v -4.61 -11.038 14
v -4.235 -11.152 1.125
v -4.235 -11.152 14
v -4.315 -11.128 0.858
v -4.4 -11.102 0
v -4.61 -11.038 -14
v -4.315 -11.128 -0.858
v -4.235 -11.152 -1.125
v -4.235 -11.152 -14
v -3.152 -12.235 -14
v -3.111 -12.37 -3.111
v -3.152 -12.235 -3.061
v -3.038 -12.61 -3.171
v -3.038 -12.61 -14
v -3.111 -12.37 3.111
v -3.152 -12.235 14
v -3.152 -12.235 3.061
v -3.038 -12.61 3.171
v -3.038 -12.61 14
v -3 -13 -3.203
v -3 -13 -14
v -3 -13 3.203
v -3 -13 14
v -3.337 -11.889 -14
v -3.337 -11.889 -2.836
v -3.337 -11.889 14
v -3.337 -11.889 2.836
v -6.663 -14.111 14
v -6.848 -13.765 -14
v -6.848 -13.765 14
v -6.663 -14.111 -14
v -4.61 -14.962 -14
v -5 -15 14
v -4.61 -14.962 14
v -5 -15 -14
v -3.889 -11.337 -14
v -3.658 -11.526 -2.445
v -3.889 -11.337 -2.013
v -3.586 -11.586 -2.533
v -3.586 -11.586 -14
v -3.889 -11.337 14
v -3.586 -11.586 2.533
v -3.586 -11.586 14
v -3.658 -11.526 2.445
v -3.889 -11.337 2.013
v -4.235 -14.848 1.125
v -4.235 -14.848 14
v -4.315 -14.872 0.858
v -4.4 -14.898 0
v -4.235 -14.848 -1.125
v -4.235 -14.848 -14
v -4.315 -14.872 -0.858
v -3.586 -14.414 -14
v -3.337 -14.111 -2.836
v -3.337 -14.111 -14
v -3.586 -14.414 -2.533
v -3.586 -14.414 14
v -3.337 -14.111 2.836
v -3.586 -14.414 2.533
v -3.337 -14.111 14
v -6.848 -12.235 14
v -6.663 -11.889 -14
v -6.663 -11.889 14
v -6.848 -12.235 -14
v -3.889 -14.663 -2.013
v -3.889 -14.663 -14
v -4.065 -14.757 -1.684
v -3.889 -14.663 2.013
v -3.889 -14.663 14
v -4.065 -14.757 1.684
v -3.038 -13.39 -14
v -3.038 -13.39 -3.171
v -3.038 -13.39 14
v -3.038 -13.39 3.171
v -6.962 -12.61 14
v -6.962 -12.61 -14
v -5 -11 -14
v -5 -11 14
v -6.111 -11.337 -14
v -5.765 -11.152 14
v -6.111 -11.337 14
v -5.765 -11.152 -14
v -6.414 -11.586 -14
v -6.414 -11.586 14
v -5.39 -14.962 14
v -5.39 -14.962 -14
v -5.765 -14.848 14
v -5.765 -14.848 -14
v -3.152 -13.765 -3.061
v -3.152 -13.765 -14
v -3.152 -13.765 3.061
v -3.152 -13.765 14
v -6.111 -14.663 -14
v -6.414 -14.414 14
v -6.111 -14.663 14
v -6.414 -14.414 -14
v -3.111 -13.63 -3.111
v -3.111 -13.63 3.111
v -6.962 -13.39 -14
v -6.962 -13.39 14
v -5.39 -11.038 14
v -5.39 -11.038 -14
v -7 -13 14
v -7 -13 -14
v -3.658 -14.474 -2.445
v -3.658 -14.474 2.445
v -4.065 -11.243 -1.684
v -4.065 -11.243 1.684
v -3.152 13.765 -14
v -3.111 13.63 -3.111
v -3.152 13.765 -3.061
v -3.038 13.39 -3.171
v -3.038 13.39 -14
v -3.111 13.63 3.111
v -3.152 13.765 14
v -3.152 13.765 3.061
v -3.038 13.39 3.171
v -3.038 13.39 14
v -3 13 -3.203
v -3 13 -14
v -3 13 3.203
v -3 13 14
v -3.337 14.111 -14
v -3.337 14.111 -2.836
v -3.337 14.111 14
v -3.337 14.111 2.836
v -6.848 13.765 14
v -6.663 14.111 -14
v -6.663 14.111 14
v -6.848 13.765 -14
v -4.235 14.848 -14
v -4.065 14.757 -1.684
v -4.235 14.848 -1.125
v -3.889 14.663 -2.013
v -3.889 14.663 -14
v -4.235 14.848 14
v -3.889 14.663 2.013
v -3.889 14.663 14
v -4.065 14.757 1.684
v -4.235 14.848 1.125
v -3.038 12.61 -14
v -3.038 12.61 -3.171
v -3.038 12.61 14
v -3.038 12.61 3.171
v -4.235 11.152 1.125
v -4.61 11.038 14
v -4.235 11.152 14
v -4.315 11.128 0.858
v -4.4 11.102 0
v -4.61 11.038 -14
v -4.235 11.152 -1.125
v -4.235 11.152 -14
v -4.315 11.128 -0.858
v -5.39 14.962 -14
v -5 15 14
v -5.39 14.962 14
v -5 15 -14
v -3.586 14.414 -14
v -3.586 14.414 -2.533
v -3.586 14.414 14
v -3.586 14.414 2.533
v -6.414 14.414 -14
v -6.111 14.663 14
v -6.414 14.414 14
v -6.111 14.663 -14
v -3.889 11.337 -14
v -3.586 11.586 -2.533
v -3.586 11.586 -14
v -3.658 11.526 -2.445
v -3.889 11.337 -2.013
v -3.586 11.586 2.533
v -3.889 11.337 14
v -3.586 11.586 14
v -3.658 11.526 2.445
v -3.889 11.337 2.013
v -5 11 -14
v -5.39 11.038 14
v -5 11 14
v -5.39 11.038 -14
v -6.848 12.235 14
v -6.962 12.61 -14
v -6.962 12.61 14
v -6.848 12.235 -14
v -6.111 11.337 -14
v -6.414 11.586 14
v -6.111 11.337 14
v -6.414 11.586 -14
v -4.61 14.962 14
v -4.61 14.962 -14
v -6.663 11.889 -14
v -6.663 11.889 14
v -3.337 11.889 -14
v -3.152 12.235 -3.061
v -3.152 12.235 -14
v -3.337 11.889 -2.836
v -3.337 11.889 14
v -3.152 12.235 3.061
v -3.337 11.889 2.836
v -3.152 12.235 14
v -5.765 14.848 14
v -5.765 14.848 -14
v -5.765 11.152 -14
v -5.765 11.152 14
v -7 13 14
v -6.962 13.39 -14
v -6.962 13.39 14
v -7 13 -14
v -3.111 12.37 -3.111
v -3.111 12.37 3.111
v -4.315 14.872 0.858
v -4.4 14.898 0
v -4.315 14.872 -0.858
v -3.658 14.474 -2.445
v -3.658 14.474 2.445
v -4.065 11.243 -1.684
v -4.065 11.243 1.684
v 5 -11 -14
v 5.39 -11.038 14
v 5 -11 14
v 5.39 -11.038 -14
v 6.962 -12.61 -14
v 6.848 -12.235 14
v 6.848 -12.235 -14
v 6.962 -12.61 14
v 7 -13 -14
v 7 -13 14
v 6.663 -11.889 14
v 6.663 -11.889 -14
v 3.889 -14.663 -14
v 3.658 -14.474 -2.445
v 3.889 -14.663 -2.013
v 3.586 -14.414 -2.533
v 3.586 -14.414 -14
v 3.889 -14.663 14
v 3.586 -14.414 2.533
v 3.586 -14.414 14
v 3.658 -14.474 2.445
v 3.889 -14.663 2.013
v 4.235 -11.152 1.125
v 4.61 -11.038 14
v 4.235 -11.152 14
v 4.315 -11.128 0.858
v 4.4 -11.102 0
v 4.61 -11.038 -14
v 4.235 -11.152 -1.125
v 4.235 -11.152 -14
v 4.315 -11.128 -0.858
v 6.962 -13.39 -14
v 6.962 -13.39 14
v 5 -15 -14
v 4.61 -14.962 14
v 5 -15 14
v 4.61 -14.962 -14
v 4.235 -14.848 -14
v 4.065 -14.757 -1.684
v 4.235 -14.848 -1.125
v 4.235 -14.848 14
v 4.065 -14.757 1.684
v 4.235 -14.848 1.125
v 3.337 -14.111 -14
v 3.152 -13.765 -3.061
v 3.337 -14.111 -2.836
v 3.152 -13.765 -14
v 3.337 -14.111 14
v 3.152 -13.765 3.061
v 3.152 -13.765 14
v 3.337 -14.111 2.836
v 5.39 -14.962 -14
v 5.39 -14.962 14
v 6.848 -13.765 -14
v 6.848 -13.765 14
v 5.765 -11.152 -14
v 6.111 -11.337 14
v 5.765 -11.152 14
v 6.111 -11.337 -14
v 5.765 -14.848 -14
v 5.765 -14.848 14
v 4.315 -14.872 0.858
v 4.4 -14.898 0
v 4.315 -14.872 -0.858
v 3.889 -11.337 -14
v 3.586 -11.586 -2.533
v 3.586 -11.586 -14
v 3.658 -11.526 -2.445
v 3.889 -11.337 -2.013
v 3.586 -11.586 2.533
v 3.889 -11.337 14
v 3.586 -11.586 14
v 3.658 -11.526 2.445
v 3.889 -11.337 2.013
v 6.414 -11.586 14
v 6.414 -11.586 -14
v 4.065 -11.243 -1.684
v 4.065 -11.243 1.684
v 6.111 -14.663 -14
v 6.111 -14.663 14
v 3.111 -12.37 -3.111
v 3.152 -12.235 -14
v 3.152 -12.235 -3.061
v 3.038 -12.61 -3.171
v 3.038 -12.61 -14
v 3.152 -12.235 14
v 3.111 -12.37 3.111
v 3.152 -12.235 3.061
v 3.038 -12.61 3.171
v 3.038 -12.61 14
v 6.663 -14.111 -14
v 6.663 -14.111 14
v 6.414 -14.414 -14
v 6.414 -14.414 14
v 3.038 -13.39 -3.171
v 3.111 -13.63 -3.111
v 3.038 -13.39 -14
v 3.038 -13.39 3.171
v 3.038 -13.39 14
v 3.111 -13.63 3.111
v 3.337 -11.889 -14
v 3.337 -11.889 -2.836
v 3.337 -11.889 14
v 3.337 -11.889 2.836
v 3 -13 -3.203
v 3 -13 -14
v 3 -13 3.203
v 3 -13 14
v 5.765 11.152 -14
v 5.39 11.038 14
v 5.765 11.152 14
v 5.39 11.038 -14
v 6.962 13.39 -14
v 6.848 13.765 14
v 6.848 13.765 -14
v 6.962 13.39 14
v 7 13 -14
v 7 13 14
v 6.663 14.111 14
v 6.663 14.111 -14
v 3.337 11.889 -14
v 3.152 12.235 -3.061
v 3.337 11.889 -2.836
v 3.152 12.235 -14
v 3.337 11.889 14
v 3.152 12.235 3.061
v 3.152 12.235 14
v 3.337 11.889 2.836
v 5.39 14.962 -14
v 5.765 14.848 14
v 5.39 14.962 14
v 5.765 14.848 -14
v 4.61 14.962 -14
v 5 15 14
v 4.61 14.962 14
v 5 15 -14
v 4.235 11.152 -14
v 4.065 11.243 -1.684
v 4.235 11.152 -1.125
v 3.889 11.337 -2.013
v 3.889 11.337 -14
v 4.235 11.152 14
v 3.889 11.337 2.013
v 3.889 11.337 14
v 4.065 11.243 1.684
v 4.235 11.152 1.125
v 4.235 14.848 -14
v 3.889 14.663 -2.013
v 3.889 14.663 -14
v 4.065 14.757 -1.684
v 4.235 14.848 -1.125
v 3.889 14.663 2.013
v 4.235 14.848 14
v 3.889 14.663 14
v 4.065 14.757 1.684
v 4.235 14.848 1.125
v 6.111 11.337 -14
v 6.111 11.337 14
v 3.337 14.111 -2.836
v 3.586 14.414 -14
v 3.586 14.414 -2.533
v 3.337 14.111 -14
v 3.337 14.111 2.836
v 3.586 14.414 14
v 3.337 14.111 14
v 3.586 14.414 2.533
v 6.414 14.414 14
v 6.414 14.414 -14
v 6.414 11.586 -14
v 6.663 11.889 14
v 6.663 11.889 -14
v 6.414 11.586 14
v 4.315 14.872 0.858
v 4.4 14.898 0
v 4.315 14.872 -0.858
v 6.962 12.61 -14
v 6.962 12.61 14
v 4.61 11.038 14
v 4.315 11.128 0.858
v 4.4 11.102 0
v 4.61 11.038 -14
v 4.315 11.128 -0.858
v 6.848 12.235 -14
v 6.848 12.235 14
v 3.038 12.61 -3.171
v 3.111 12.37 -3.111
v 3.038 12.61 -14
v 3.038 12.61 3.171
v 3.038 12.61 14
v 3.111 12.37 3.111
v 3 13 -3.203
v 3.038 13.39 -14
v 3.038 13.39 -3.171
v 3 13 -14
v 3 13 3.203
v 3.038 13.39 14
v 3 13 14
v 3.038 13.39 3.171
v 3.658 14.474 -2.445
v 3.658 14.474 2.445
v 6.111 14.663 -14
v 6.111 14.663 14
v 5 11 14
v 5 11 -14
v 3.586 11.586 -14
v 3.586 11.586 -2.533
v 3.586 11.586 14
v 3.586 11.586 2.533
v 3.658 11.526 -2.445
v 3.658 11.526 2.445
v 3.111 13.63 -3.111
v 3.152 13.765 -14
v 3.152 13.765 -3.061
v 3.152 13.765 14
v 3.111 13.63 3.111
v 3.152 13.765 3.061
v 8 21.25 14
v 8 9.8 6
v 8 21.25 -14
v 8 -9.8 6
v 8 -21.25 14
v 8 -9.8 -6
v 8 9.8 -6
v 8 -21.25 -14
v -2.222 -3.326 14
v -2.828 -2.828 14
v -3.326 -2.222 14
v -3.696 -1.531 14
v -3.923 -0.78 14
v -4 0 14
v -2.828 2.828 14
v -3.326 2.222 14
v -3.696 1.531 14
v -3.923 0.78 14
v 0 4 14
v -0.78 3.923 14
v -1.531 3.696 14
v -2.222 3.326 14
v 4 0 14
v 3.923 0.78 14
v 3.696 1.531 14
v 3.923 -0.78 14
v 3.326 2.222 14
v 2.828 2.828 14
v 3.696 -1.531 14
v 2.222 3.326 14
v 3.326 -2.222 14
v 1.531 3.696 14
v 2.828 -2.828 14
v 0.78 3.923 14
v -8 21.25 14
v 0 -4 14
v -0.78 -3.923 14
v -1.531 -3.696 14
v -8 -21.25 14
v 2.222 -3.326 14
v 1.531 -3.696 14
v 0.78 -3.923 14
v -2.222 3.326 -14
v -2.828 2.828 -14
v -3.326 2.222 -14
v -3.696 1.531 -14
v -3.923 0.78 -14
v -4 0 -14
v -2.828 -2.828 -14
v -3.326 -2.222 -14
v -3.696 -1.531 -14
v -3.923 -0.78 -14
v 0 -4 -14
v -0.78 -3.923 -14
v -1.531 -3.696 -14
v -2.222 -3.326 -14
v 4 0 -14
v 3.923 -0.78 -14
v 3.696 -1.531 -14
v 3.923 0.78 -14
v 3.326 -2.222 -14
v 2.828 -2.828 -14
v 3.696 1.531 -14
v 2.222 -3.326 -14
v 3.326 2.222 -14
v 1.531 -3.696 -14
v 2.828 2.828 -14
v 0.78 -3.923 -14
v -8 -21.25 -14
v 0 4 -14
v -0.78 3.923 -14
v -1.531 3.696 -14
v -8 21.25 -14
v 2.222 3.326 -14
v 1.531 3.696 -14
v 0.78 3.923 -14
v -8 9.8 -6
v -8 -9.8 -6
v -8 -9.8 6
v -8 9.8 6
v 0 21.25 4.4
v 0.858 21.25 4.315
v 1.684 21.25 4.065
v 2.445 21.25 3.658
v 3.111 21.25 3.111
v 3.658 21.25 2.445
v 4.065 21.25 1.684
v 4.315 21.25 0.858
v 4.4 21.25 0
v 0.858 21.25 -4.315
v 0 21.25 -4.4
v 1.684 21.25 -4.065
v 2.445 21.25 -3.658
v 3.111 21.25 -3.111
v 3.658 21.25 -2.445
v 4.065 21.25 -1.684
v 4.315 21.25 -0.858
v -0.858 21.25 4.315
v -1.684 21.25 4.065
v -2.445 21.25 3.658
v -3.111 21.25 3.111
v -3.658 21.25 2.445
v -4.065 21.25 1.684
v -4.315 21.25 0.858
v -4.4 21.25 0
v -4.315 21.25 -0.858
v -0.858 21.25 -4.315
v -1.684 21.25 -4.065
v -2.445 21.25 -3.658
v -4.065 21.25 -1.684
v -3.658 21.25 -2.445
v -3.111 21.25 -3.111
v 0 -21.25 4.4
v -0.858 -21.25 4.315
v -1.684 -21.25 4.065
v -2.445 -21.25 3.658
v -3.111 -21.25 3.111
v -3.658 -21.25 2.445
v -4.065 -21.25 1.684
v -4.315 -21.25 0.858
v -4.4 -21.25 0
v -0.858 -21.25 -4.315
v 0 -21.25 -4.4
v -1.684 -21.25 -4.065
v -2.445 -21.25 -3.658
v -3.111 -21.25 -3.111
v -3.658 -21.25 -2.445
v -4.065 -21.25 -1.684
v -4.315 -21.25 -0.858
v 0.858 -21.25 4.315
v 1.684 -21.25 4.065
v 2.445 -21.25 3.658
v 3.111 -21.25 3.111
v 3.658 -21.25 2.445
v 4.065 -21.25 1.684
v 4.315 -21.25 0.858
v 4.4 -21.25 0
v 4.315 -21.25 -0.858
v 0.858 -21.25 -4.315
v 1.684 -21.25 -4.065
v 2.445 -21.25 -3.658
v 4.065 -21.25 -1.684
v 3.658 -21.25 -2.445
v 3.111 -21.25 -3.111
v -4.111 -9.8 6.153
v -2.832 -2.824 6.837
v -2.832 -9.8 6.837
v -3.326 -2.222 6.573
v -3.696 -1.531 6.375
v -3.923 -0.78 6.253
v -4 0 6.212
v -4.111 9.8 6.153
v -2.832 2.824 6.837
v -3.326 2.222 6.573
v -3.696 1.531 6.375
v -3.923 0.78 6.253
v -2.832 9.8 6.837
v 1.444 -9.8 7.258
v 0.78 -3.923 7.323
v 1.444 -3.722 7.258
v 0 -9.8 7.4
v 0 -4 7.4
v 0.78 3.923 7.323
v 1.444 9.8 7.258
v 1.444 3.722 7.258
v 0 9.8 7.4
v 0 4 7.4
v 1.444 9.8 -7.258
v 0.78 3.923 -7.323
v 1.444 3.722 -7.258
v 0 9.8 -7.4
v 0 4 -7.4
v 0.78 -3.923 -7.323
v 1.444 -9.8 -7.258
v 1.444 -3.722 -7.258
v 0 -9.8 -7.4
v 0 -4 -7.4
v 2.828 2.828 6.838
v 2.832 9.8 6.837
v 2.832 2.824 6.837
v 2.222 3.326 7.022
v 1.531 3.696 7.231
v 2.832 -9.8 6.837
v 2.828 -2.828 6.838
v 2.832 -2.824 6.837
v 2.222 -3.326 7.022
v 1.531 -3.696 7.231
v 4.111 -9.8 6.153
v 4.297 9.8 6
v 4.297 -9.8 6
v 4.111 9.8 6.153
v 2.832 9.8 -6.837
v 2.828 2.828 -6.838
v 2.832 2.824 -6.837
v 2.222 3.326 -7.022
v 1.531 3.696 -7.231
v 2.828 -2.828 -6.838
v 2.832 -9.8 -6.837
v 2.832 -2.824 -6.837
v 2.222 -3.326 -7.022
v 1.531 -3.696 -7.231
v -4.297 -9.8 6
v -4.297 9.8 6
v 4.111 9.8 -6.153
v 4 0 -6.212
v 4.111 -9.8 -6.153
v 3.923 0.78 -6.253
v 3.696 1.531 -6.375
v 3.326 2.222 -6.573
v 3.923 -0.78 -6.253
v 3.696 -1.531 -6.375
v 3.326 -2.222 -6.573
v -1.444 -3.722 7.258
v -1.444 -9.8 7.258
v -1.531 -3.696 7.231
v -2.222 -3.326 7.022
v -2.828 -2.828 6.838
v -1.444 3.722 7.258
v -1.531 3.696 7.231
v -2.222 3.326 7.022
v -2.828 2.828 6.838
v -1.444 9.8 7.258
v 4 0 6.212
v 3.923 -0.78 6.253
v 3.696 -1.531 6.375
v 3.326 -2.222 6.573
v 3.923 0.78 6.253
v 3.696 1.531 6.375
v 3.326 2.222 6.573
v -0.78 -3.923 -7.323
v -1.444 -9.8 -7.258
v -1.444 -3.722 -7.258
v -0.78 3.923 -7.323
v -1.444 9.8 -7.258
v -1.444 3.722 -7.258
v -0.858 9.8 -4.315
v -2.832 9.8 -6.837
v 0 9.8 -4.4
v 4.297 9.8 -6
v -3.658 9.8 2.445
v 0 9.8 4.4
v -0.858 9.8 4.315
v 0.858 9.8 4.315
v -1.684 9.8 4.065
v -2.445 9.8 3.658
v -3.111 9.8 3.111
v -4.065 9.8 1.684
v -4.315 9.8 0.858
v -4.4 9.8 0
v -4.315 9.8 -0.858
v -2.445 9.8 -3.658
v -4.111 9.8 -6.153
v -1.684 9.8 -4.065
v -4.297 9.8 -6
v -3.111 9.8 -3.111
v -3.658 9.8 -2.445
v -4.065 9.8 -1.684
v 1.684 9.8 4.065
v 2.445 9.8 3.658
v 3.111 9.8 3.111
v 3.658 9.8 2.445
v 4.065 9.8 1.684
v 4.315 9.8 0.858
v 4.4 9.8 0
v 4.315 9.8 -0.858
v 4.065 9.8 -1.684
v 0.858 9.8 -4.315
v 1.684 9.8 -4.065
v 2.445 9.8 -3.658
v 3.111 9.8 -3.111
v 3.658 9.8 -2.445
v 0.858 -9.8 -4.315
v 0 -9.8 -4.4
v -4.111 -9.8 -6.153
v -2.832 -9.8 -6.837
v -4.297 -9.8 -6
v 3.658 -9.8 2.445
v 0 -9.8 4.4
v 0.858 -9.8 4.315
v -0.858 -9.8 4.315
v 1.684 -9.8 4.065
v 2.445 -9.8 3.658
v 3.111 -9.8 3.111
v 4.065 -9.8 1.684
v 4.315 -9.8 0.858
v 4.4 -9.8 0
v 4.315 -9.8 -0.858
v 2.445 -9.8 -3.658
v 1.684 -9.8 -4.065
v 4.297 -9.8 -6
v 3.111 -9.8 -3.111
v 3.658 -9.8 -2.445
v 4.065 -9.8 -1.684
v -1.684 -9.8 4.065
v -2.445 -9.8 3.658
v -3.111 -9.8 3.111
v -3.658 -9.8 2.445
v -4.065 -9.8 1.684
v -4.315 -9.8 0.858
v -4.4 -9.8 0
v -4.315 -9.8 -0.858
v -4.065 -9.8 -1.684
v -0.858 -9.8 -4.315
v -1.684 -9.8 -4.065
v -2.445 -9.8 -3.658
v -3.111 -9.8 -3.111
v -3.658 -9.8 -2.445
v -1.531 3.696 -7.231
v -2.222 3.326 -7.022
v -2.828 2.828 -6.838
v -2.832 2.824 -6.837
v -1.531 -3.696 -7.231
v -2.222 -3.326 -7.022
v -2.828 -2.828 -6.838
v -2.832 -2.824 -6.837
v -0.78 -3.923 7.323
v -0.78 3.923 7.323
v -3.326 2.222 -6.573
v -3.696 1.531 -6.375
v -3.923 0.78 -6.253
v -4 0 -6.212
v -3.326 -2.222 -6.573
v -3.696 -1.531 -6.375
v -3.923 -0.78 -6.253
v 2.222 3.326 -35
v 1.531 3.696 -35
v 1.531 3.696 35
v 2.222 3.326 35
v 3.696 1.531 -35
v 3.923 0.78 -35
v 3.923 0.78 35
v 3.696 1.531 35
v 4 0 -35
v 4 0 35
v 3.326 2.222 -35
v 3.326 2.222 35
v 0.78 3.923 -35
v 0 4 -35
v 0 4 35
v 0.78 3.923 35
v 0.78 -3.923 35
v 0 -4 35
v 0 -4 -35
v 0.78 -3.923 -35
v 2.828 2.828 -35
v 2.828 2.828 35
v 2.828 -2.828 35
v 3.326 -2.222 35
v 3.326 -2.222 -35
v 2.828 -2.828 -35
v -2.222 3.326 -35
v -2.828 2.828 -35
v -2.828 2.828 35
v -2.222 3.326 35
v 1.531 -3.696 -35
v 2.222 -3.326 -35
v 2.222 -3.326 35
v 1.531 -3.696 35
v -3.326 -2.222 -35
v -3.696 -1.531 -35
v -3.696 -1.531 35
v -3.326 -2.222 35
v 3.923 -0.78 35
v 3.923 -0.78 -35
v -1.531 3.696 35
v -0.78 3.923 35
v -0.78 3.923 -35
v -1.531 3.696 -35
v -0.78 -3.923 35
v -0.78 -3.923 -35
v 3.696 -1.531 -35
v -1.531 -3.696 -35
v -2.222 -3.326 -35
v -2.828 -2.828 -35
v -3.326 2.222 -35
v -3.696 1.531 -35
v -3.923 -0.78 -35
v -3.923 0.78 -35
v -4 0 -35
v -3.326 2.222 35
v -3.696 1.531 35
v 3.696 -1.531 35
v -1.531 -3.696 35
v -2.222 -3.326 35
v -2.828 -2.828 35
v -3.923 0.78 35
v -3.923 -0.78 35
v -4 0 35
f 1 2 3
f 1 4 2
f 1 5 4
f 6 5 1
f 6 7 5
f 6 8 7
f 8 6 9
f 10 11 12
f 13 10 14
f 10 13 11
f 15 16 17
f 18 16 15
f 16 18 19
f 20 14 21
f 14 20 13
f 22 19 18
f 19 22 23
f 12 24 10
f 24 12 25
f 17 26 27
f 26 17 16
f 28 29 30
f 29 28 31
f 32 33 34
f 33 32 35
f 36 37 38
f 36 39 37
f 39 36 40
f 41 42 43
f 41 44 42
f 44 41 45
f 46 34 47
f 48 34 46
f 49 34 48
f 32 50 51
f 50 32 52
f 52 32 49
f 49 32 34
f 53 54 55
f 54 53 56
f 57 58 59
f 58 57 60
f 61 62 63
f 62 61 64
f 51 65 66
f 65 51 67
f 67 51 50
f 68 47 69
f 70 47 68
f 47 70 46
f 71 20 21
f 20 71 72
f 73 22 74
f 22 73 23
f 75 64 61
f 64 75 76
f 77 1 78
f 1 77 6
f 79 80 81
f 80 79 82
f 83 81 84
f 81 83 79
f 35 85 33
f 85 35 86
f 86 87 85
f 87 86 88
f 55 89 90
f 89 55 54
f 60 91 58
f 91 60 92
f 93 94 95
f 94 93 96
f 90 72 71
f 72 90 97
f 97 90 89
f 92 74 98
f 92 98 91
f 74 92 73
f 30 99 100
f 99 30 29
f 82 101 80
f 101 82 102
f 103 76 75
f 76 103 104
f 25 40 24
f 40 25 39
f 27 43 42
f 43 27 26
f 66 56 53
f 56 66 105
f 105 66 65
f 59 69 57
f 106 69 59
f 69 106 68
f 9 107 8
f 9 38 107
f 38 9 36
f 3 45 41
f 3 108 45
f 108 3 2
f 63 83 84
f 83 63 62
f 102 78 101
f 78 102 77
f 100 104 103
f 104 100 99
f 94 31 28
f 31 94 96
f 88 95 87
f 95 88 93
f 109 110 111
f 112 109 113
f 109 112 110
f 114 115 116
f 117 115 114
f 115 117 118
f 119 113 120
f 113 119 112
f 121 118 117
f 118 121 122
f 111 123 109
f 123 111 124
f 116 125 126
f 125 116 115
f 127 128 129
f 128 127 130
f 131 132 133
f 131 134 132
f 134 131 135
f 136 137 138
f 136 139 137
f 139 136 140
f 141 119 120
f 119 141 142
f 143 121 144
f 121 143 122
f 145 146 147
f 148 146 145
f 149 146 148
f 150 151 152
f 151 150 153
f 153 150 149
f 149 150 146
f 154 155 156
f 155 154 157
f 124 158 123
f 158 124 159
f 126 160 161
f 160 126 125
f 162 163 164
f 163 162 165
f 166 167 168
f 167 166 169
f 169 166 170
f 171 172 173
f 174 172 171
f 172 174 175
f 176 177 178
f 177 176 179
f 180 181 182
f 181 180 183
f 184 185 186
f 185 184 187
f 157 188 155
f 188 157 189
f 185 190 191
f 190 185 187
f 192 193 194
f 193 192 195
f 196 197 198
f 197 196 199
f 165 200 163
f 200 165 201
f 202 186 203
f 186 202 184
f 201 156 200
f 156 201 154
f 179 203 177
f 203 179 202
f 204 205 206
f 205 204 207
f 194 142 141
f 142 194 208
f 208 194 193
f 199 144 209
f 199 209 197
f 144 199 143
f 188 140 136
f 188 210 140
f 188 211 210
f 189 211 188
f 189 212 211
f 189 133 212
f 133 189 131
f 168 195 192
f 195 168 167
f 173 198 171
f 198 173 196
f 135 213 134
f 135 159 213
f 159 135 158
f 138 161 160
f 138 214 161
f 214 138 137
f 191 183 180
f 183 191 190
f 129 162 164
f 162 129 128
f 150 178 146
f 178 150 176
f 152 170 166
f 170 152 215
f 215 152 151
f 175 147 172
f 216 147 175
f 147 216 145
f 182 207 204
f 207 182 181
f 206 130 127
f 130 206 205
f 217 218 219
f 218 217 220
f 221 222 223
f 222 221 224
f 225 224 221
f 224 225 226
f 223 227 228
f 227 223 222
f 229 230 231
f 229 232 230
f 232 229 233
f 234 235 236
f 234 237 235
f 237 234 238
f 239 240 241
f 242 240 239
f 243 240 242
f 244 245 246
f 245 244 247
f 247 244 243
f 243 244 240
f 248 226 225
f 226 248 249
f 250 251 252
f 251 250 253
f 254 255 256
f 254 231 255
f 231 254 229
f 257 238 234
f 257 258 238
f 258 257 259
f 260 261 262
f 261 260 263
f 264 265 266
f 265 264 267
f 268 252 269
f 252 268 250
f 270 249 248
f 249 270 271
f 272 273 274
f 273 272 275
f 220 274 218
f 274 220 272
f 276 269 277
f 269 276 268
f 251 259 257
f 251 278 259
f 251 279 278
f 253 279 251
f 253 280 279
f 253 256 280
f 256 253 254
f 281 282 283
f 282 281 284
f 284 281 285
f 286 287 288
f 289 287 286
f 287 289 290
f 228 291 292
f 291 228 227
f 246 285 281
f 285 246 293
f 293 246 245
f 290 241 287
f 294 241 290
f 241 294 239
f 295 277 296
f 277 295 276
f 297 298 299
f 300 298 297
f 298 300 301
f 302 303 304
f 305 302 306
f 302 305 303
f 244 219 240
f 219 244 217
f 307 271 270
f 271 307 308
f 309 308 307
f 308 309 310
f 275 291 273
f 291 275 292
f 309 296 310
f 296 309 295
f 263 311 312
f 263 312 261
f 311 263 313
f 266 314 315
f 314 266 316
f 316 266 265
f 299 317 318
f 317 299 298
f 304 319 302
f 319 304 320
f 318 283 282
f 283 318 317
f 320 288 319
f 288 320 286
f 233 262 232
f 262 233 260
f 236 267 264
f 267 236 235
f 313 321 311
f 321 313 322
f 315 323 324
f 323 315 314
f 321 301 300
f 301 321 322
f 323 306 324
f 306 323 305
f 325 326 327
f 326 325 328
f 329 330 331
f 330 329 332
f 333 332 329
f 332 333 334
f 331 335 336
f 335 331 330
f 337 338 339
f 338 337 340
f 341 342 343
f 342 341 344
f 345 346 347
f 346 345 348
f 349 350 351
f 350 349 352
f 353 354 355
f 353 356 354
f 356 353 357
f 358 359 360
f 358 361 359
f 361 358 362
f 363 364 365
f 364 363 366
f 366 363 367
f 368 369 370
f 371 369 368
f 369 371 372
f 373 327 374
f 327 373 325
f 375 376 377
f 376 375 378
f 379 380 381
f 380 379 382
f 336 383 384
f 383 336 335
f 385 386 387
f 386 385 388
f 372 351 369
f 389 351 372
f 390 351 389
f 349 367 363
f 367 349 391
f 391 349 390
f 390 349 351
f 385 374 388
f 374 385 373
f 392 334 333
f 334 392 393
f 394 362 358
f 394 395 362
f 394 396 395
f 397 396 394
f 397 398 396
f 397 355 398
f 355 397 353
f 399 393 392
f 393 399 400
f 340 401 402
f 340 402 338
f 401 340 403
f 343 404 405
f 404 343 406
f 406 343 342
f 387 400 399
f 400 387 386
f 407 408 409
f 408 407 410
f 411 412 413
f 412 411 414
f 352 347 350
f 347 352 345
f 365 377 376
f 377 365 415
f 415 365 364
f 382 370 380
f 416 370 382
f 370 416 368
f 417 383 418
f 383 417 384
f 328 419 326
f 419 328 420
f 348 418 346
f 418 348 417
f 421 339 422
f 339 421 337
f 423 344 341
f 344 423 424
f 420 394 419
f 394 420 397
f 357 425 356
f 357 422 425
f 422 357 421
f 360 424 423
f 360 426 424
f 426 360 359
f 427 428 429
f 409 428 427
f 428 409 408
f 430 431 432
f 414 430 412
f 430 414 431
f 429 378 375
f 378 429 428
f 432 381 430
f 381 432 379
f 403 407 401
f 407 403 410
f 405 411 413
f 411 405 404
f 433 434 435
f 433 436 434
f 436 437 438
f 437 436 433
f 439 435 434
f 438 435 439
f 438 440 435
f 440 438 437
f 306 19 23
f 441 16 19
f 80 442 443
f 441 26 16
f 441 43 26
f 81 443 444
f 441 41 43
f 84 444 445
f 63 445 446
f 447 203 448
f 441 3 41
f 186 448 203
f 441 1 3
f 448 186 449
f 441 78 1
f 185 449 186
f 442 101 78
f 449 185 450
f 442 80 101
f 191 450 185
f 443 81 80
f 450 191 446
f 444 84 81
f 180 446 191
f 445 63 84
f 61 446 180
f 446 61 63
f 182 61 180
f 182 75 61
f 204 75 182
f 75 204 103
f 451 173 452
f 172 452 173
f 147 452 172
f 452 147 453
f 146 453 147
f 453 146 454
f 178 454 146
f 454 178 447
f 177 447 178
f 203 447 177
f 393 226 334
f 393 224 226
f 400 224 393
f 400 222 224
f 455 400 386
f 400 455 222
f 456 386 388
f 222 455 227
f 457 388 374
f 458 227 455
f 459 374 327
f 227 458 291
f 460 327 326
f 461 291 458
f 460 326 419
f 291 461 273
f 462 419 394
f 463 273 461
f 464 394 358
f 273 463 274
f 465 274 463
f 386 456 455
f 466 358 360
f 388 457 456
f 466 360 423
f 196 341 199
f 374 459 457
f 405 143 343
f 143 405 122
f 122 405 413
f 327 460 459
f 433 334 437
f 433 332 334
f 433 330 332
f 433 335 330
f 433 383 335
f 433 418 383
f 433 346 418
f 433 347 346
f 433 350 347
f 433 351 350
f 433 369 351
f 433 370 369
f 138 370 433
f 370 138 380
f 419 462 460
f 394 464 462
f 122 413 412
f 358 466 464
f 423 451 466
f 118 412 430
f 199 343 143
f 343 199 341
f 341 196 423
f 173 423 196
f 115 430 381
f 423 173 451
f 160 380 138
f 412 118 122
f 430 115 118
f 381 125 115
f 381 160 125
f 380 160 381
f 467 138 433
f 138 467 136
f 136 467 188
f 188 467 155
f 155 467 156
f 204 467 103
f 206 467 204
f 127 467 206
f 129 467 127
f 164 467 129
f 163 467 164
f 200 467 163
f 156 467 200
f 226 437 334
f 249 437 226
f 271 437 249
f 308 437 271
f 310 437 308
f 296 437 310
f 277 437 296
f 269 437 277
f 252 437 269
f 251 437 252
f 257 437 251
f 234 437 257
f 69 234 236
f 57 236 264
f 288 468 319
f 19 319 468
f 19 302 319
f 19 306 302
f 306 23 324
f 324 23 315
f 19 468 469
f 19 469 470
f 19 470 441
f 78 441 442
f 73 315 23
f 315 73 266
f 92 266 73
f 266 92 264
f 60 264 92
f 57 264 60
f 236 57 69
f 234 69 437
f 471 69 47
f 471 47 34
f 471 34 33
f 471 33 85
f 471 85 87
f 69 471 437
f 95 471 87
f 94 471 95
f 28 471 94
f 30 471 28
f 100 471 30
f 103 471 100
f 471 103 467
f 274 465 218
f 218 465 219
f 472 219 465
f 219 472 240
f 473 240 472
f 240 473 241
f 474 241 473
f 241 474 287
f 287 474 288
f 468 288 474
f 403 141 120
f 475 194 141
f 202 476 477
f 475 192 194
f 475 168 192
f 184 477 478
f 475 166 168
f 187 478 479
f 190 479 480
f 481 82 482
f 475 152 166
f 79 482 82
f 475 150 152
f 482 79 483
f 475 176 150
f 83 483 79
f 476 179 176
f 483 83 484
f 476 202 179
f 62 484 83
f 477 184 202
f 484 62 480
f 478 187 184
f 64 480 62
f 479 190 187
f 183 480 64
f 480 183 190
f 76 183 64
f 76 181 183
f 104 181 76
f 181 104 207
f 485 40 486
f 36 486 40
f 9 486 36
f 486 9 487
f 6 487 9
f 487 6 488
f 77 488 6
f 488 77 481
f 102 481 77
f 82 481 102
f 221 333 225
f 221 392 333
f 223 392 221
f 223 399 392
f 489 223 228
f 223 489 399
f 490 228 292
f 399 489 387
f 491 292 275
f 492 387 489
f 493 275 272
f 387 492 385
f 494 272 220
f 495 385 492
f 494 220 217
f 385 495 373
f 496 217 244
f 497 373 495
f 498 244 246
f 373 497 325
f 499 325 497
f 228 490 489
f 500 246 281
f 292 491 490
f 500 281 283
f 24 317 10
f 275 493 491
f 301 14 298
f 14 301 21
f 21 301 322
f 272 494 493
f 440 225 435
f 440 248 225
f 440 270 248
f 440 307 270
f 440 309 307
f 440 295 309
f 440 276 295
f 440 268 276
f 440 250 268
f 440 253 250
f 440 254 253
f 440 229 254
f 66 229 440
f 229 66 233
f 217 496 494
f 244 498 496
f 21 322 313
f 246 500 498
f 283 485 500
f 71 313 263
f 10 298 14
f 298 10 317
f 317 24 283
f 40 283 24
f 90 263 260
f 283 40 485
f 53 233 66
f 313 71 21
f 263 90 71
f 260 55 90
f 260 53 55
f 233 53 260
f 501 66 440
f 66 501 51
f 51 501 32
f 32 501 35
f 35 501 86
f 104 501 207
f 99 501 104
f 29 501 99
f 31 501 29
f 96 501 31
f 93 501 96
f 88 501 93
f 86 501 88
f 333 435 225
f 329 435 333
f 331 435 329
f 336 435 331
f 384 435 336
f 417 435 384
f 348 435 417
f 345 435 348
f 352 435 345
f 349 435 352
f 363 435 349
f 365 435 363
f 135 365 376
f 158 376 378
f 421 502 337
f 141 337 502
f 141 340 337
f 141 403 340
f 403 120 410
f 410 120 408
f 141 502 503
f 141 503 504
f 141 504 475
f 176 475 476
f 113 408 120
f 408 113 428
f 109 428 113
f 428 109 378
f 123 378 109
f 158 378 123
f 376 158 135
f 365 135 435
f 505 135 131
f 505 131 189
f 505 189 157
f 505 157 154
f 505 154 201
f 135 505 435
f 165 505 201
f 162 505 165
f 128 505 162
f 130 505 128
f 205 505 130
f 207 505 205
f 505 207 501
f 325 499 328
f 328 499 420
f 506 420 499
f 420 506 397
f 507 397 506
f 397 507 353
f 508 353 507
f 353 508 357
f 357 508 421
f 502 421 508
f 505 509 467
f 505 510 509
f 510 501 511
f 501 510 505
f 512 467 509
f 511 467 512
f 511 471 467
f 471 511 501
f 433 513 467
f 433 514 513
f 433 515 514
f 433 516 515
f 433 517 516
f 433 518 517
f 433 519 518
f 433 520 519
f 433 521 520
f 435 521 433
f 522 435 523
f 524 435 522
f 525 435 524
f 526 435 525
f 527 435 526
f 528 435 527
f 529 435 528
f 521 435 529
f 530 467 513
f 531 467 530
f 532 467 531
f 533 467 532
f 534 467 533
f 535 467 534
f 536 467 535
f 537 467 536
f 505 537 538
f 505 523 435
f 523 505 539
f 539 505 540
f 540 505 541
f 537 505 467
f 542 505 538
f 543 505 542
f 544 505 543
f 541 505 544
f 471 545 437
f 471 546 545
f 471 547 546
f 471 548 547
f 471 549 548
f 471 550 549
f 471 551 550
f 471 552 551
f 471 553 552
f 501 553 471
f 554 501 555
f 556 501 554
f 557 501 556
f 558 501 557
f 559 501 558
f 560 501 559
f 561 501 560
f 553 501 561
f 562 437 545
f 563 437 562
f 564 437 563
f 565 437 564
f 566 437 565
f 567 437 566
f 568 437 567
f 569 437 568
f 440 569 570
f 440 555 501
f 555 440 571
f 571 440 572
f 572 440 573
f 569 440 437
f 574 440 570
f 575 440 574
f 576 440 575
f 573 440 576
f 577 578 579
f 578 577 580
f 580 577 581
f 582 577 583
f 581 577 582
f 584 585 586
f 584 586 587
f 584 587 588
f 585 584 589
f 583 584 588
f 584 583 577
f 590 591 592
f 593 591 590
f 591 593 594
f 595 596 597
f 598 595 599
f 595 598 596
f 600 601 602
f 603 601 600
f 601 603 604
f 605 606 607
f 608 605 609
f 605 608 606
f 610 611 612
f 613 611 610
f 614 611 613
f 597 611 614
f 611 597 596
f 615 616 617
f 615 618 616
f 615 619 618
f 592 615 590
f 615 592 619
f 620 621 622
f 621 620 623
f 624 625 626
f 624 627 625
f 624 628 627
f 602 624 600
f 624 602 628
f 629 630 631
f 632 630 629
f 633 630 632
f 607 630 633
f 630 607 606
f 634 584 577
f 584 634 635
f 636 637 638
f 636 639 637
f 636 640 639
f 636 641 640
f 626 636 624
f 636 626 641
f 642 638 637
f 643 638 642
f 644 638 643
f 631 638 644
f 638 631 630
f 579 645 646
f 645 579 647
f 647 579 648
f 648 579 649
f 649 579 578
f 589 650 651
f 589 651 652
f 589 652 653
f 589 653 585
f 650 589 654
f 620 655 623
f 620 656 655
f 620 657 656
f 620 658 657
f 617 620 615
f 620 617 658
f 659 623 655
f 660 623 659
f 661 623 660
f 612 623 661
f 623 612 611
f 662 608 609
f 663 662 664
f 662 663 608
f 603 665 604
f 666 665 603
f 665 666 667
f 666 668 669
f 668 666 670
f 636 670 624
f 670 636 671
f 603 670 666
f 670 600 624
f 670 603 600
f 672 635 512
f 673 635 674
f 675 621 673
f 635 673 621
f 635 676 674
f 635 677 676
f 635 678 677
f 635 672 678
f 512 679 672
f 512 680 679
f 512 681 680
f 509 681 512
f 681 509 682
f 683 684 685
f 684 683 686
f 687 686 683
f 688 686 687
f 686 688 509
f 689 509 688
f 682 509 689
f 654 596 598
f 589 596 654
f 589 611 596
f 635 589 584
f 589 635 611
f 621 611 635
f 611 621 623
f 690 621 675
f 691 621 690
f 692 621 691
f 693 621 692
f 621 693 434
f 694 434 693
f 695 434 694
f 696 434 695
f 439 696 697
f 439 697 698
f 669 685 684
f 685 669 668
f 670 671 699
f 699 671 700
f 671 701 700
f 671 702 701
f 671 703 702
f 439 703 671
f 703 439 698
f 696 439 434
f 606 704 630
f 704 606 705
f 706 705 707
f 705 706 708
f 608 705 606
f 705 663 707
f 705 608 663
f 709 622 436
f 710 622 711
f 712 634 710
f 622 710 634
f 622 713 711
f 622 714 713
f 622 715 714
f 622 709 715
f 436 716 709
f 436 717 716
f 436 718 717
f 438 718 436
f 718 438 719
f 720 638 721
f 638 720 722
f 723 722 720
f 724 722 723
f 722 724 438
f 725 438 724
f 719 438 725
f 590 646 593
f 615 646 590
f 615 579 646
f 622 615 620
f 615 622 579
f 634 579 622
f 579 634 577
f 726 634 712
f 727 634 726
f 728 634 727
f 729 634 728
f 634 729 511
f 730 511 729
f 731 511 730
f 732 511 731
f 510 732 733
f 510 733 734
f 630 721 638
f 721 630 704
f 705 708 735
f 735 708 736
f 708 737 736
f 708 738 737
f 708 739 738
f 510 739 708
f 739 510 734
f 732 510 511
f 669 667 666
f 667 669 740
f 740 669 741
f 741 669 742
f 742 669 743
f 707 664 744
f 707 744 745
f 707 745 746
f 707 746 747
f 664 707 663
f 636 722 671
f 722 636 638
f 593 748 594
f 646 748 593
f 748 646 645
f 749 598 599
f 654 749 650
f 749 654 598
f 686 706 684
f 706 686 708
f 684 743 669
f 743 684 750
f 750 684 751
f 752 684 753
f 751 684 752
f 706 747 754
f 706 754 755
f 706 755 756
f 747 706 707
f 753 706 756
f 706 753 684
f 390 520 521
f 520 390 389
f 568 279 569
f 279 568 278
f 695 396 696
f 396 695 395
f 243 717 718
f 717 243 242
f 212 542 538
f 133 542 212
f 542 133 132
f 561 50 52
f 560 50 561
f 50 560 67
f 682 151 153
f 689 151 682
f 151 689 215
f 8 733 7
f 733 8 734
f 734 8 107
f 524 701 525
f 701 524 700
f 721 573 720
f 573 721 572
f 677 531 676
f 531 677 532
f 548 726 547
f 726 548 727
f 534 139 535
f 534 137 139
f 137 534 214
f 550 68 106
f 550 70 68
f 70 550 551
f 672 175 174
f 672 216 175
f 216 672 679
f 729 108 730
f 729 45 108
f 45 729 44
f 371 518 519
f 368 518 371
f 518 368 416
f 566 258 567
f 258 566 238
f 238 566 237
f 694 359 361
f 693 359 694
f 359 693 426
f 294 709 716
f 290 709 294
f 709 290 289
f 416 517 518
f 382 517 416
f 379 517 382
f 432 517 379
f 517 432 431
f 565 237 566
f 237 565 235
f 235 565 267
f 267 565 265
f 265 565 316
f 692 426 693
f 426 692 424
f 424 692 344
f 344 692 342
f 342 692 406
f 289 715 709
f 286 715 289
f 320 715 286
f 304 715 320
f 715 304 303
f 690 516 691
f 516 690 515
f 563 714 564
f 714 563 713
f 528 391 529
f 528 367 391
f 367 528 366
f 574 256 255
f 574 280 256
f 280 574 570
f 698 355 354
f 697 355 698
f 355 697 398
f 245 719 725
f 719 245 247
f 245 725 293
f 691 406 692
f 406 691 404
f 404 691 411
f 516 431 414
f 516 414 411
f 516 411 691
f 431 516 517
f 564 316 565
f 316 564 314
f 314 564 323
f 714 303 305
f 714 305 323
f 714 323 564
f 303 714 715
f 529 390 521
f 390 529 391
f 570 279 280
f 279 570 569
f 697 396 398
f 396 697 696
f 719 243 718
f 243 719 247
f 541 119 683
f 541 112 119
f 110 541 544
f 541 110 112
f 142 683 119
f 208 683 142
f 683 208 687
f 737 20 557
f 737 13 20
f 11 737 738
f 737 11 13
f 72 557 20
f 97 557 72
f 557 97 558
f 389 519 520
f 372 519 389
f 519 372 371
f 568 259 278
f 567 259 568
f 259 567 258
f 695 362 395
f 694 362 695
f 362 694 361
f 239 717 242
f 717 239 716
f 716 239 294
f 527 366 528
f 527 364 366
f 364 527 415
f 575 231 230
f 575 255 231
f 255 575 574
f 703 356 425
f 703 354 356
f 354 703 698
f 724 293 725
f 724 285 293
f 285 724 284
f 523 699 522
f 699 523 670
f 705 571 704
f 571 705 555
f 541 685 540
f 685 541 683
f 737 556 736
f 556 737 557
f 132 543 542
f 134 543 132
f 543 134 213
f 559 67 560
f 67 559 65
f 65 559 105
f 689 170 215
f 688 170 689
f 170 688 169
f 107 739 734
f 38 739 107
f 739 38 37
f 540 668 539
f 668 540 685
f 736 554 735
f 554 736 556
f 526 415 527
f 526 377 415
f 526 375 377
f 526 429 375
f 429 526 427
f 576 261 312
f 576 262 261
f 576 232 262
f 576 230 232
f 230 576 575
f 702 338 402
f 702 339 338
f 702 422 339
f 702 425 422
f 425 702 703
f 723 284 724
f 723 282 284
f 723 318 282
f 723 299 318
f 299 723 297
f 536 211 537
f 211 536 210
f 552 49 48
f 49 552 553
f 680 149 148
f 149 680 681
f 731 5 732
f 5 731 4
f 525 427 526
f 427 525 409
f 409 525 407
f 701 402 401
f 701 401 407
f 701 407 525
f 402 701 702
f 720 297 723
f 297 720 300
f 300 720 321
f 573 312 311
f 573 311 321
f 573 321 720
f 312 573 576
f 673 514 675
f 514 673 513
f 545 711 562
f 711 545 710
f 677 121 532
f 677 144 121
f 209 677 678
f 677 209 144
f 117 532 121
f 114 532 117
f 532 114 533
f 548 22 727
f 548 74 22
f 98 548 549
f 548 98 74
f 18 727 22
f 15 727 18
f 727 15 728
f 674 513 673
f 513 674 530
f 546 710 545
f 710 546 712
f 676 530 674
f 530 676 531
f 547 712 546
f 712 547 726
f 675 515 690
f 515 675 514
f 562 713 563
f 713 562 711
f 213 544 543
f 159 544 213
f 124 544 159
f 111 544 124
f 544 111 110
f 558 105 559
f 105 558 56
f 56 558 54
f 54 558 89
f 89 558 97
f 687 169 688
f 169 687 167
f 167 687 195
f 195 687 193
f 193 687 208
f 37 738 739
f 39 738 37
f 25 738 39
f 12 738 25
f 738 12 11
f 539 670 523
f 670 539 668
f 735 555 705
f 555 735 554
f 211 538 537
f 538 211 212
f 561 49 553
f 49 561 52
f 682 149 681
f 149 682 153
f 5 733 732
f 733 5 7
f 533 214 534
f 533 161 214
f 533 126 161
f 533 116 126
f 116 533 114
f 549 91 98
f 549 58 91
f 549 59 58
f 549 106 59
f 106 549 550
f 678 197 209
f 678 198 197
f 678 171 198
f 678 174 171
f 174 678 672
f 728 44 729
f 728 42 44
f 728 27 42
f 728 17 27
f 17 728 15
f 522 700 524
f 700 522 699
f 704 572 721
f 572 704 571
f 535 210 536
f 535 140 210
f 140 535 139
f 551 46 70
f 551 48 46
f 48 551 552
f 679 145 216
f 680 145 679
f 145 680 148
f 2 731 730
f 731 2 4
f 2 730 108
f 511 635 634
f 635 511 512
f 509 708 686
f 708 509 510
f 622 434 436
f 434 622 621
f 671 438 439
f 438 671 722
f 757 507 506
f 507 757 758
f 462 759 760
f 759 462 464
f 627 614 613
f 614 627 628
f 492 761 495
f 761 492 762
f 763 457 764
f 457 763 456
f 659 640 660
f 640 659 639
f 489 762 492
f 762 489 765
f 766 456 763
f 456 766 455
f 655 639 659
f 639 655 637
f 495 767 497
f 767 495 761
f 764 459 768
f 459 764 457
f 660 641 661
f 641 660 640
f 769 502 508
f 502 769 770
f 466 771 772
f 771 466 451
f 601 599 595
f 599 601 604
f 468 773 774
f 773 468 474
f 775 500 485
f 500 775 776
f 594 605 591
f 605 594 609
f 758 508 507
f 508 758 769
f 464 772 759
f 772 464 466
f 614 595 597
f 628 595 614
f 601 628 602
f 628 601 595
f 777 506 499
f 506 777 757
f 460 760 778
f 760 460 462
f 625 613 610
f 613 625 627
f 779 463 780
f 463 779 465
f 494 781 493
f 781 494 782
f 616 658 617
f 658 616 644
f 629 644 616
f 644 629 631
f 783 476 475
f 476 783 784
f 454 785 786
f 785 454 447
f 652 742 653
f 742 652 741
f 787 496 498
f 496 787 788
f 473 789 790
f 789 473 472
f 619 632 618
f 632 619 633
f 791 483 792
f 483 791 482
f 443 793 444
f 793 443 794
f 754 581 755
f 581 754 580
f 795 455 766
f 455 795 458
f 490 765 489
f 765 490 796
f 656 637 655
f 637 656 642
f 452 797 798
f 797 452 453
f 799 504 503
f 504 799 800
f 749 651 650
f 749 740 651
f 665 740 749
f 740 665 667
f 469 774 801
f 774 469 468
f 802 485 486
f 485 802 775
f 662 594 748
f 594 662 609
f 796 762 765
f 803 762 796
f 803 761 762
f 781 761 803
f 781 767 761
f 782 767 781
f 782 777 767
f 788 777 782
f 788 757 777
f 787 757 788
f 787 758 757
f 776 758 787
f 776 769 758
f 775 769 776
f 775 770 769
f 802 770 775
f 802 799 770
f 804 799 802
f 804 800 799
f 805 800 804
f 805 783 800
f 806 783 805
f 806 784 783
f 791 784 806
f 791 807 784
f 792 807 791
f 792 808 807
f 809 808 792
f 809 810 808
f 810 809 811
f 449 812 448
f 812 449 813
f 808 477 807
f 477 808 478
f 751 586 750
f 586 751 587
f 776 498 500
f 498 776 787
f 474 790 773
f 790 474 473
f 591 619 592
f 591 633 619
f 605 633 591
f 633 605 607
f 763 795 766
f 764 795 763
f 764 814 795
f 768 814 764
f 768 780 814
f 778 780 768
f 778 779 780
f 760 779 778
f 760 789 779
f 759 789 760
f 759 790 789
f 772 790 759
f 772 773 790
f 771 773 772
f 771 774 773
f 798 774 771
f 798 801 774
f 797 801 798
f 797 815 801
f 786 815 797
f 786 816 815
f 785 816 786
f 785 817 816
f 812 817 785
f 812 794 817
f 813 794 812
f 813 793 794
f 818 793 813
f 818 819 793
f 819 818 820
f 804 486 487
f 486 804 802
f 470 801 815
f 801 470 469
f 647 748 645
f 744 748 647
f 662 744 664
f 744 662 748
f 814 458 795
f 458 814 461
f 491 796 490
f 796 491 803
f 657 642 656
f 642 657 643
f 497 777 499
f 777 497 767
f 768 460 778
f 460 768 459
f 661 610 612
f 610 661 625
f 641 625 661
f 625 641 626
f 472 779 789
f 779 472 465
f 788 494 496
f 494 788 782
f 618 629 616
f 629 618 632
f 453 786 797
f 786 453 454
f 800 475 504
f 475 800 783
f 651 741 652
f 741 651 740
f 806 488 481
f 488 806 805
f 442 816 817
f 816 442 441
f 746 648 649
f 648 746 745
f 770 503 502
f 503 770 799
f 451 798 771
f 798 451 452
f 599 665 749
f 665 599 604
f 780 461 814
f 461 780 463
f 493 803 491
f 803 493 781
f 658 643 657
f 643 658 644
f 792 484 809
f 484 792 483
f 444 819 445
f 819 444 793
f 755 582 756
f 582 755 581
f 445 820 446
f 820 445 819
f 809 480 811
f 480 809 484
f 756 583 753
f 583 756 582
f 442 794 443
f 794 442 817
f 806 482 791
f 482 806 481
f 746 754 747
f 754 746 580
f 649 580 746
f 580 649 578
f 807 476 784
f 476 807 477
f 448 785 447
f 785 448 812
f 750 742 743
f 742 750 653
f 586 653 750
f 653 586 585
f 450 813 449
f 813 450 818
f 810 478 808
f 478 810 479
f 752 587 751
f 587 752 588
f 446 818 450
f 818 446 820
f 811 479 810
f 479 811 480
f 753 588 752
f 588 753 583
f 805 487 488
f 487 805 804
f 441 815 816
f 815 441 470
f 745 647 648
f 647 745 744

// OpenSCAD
// Parameters
block_width_mm = 16; //[8:32:0.5]
block_height_mm = 28; //[14:56:0.5]
block_length_mm = 42.5; //[21.25:85:0.5]
eps_mm = 0.8; //[0.2:2:0.1]
edge_chamfer_mm = 1.2; //[0.5:3:0.1]
leadscrew_diameter_mm = 8; //[4:16:0.5]
leadscrew_length_mm = 70; //[42.5:140:1]
nut_outer_diameter_or_profile_mm = 14; //[8:24:0.5]
nut_length_mm = 18; //[10:30:0.5]
nut_pocket_clearance_mm = 0.4; //[0.1:1.2:0.1]
retention_screw_diameter_mm = 3; //[2:6:0.5]
retention_screw_offset_z_mm = 6; //[3:12:0.5]
mounting_hole_diameter_mm = 4; //[2.5:8:0.5]
mounting_hole_spacing_y_mm = 26; //[14:38:0.5]
mounting_hole_spacing_x_mm = 10; //[6:14:0.5]
access_slot_width_mm = 10; //[6:14:0.5]
access_slot_height_mm = 12; //[6:20:0.5]
access_slot_depth_mm = 10; //[5:20:0.5]

// Leadscrew - complete geometry
module leadscrew() {
  color("Silver") {
    cylinder(r=leadscrew_diameter_mm/2, h=leadscrew_length_mm, center=true, $fn=32);
  }
}

// Main housing with internal features
module housing_with_internal_features() {
  difference() {
    // Main body block
    cube([block_width_mm, block_length_mm, block_height_mm], center=true);
    
    // Leadscrew nut cavity or bore
    rotate([90, 0, 0])
      translate([0, 0, 0])
      cylinder(r=(nut_outer_diameter_or_profile_mm/2) + nut_pocket_clearance_mm, 
               h=nut_length_mm + 2*eps_mm, center=true, $fn=32);
    
    // Leadscrew bore
    rotate([90, 0, 0])
      translate([0, 0, 0])
      cylinder(r=(leadscrew_diameter_mm/2) + nut_pocket_clearance_mm, 
               h=block_length_mm + 2*eps_mm, center=true, $fn=32);
    
    // Nut retention features holes
    rotate([0, 90, 0])
      translate([0, 0, retention_screw_offset_z_mm])
      cylinder(r=retention_screw_diameter_mm/2, 
               h=block_width_mm + 2*eps_mm, center=true, $fn=32);
    rotate([0, 90, 0])
      translate([0, 0, -retention_screw_offset_z_mm])
      cylinder(r=retention_screw_diameter_mm/2, 
               h=block_width_mm + 2*eps_mm, center=true, $fn=32);
    
    // Mounting holes
    for (x = [-1, 1], y = [-1, 1]) {
      translate([x * mounting_hole_spacing_x_mm/2, y * mounting_hole_spacing_y_mm/2, 0])
        cylinder(r=mounting_hole_diameter_mm/2, 
                 h=block_height_mm + 2*eps_mm, center=true, $fn=32);
    }
    
    // Access clearance cutouts
    translate([-(block_width_mm/2) + (access_slot_depth_mm/2) - eps_mm, 0, 0])
      cube([access_slot_depth_mm + 2*eps_mm, nut_length_mm + 2*eps_mm, access_slot_height_mm], center=true);
    translate([(block_width_mm/2) - (access_slot_depth_mm/2) + eps_mm, 0, 0])
      cube([access_slot_depth_mm + 2*eps_mm, nut_length_mm + 2*eps_mm, access_slot_height_mm], center=true);
    
    // Chamfers or fillets
    for (x = [-1, 1], y = [-1, 1]) {
      rotate([0, 0, 45])
        translate([x * (block_width_mm/2 - edge_chamfer_mm/2), y * (block_length_mm/2 - edge_chamfer_mm/2), 0])
        cube([edge_chamfer_mm, edge_chamfer_mm, block_height_mm + 2*eps_mm], center=true);
    }
  }
}

// Assembly
module assembly() {
  union() {
    housing_with_internal_features();
    translate([0, 0, 0]) leadscrew();
  }
}

assembly();
